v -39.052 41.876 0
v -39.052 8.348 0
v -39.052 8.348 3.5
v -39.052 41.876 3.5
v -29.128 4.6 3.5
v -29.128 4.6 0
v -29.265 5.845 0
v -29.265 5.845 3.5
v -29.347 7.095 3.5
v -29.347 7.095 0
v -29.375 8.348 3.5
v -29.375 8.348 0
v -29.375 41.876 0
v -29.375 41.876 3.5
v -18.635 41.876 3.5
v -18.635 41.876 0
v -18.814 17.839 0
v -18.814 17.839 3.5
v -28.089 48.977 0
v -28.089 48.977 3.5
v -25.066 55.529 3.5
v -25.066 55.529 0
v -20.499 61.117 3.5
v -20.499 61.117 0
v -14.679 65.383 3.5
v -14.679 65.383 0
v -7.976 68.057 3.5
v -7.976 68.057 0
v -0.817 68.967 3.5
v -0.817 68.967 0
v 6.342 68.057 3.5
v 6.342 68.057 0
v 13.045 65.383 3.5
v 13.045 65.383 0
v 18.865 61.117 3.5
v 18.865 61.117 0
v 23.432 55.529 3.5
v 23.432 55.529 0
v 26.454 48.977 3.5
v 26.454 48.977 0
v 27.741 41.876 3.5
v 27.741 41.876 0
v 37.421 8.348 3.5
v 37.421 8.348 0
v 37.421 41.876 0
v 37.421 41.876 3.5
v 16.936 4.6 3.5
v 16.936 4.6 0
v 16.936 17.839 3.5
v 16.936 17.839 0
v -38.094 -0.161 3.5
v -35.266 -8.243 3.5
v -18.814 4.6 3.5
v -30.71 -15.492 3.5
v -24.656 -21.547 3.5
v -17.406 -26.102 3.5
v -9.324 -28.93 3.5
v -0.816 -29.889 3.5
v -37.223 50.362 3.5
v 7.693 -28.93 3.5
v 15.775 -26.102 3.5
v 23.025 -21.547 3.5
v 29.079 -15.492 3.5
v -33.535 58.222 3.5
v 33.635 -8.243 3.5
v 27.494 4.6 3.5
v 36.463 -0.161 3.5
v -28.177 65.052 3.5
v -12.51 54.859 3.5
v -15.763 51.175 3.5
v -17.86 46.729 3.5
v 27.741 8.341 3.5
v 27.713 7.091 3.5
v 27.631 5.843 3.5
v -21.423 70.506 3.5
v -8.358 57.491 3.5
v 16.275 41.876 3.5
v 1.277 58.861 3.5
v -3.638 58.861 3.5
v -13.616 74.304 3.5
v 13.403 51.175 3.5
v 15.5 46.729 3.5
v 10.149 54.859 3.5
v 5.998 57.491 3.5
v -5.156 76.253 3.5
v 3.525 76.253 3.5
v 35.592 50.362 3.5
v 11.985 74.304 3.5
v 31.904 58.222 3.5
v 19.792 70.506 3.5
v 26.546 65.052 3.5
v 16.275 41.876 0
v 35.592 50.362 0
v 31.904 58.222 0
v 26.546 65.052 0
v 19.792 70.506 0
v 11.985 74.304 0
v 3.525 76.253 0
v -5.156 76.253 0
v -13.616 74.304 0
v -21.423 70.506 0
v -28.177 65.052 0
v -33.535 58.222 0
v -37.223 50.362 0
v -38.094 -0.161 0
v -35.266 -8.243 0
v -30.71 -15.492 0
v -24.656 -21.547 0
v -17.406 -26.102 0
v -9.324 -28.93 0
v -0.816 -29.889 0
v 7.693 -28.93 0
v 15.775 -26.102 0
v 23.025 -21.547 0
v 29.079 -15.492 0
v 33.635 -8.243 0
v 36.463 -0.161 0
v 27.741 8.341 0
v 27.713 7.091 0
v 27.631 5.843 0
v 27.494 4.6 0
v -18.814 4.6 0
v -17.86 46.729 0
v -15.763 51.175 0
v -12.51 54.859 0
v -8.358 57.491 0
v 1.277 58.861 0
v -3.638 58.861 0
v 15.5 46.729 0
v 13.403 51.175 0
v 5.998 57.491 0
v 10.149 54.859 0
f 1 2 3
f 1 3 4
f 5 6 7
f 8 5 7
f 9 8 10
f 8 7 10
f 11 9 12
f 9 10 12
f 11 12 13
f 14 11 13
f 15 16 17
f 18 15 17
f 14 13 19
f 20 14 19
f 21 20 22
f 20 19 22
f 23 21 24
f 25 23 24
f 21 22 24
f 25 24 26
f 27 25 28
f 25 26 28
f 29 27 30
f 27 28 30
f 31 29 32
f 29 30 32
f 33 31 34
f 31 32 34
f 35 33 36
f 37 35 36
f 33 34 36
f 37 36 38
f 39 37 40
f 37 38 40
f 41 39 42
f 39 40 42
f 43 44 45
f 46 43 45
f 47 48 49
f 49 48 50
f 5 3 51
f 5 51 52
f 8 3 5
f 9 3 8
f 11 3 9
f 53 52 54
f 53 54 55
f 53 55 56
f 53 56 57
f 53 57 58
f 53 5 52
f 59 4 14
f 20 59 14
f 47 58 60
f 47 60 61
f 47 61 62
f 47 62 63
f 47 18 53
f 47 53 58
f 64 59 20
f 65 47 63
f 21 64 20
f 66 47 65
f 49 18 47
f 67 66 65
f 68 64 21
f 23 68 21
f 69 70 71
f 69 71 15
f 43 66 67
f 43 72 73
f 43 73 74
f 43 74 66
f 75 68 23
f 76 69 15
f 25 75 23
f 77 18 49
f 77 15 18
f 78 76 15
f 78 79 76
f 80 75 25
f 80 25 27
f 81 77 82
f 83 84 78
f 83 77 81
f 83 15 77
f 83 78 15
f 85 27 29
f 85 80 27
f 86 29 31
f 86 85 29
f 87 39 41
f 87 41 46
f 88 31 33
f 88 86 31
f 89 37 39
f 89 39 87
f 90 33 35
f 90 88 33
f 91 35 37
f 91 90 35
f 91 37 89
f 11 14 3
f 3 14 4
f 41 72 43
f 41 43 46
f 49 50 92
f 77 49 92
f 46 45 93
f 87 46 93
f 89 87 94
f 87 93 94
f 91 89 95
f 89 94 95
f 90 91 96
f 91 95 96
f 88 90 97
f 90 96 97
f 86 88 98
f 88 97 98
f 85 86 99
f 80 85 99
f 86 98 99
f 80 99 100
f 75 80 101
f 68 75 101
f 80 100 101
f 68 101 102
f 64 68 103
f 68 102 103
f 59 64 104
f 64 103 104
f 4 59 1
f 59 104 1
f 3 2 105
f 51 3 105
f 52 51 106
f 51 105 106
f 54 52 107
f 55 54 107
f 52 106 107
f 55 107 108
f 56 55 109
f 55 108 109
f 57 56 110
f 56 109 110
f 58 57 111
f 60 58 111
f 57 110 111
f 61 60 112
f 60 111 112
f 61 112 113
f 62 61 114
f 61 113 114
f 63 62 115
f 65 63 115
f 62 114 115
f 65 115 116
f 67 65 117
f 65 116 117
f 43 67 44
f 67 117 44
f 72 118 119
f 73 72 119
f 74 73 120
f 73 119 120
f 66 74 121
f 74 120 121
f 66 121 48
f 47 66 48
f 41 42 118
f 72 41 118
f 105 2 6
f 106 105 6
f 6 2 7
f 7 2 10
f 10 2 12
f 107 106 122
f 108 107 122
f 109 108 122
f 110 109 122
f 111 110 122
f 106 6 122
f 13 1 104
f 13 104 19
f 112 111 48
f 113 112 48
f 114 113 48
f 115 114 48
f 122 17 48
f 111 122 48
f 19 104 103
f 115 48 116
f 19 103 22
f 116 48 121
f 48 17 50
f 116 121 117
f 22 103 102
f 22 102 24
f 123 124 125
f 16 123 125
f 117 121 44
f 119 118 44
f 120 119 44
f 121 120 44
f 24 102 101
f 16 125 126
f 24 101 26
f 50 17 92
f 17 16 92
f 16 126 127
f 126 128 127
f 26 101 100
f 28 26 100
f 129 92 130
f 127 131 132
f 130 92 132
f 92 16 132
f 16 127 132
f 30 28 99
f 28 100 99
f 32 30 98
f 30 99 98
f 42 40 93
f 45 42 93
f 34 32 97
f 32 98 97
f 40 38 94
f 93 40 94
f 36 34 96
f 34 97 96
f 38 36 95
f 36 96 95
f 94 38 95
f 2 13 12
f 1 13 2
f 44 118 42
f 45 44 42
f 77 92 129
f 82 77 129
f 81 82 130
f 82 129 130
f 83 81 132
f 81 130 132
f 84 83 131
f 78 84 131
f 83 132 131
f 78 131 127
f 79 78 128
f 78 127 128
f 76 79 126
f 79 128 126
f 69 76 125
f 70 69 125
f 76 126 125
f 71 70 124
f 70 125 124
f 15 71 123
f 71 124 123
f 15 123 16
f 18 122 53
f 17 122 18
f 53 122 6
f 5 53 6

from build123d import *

# Parameters (mm, degrees)
F0_W     = 9.6774
F0_H     = 33.528
F0_W_2   = 6.7188069224
F0_H_2   = 4.5997034758
F0_W_3   = 23.2836488279
F0_W_4   = 5.7477712986
F0_H_3   = 13.2390651852
F1_DEPTH = 3.5


with BuildPart() as f1:
    # F0 (on Top) → F1 (new body)
    with BuildSketch(Plane.XY):
        with Locations((-34.2135546392, 25.1117386506)):
            Rectangle(F0_W, F0_H)
        with BuildLine():
            ThreePointArc((-29.3748546392, 41.8757386506), (-0.8171033114, 68.9673107238), (27.7406480163, 41.8757386506))
            Line((27.7406480163, 41.8757386506), (37.4212376773, 41.8757386506))
            ThreePointArc((37.4212376773, 41.8757386506), (-0.8155084809, 76.4992777712), (-39.0522546392, 41.8757386506))
            Line((-39.0522546392, 41.8757386506), (-29.3748546392, 41.8757386506))
        make_face()
        Polygon((27.7406480163, 41.8757386506), (27.7406480163, 8.341178298), (37.4212376773, 8.3477386506), (37.4212376773, 41.8757386506), align=None)
        with BuildLine():
            ThreePointArc((27.7406480163, 8.341178298), (27.6786104385, 6.4663822858), (27.4936267406, 4.5997034758))
            ThreePointArc((27.4936267406, 4.5997034758), (27.0884181011, 2.2792068562), (26.4933427197, 0))
            ThreePointArc((26.4933427197, 0), (-0.8171029347, -20.210013054), (-28.127548589, 0))
            ThreePointArc((-28.127548589, 0), (-28.7226239704, 2.2792068562), (-29.1278326099, 4.5997034758))
            ThreePointArc((-29.1278326099, 4.5997034758), (-29.3130322146, 6.4696553488), (-29.3748546392, 8.3477386506))
            Line((-29.3748546392, 8.3477386506), (-39.0522546392, 8.3477386506))
            ThreePointArc((-39.0522546392, 8.3477386506), (-0.8155084809, -29.8890075077), (37.4212376773, 8.3477386506))
            Line((37.4212376773, 8.3477386506), (27.7406480163, 8.341178298))
        make_face()
        with BuildLine():
            Line((27.4936267406, 4.5997034758), (16.9359110296, 4.5997034758))
            Line((16.9359110296, 4.5997034758), (16.9359110296, 0))
            Line((16.9359110296, 0), (26.4933427197, 0))
            ThreePointArc((26.4933427197, 0), (27.0884181011, 2.2792068562), (27.4936267406, 4.5997034758))
        make_face()
        with Locations((13.5765075684, 2.2998517379)):
            Rectangle(F0_W_2, F0_H_2)
        with Locations((-1.4247203068, 2.2998517379)):
            Rectangle(F0_W_3, F0_H_2)
        with Locations((-15.9404303701, 2.2998517379)):
            Rectangle(F0_W_4, F0_H_2)
        with BuildLine():
            Line((-18.8143160194, 0), (-18.8143160194, 4.5997034758))
            Line((-18.8143160194, 4.5997034758), (-29.1278326099, 4.5997034758))
            ThreePointArc((-29.1278326099, 4.5997034758), (-28.7226239704, 2.2792068562), (-28.127548589, 0))
            Line((-28.127548589, 0), (-18.8143160194, 0))
        make_face()
        with BuildLine():
            ThreePointArc((-13.0665447208, 41.155968661), (-1.5272068761, 54.4534372667), (10.792715475, 41.8757386506))
            Line((10.792715475, 41.8757386506), (10.2171041071, 17.838768661))
            Line((10.2171041071, 17.838768661), (16.9359110296, 17.838768661))
            Line((16.9359110296, 17.838768661), (16.2751674652, 41.8757386506))
            ThreePointArc((16.2751674652, 41.8757386506), (-1.1801254004, 59.0346097607), (-18.6354182661, 41.8757386506))
            Line((-18.6354182661, 41.8757386506), (-18.8143160194, 17.838768661))
            Line((-18.8143160194, 17.838768661), (-13.0665447208, 17.838768661))
            Line((-13.0665447208, 17.838768661), (-13.0665447208, 41.155968661))
        make_face()
        with Locations((13.5765075684, 11.2192360684)):
            Rectangle(F0_W_2, F0_H_3)
        with Locations((-15.9404303701, 11.2192360684)):
            Rectangle(F0_W_4, F0_H_3)
        with BuildLine():
            Line((10.2171041071, 17.838768661), (10.792715475, 41.8757386506))
            ThreePointArc((10.792715475, 41.8757386506), (-1.5272068761, 54.4534372667), (-13.0665447208, 41.155968661))
            Line((-13.0665447208, 41.155968661), (-13.0665447208, 17.838768661))
            Line((-13.0665447208, 17.838768661), (-13.0665447208, 4.5997034758))
            Line((-13.0665447208, 4.5997034758), (10.2171041071, 4.5997034758))
            Line((10.2171041071, 4.5997034758), (10.2171041071, 17.838768661))
        make_face()
        with BuildLine():
            Line((16.9359110296, 0), (10.2171041071, 0))
            Line((10.2171041071, 0), (-13.0665447208, 0))
            Line((-13.0665447208, 0), (-18.8143160194, 0))
            Line((-18.8143160194, 0), (-28.127548589, 0))
            ThreePointArc((-28.127548589, 0), (-0.8171029347, -20.210013054), (26.4933427197, 0))
            Line((26.4933427197, 0), (16.9359110296, 0))
        make_face()
    extrude(amount=F1_DEPTH)


solid = f1.part
